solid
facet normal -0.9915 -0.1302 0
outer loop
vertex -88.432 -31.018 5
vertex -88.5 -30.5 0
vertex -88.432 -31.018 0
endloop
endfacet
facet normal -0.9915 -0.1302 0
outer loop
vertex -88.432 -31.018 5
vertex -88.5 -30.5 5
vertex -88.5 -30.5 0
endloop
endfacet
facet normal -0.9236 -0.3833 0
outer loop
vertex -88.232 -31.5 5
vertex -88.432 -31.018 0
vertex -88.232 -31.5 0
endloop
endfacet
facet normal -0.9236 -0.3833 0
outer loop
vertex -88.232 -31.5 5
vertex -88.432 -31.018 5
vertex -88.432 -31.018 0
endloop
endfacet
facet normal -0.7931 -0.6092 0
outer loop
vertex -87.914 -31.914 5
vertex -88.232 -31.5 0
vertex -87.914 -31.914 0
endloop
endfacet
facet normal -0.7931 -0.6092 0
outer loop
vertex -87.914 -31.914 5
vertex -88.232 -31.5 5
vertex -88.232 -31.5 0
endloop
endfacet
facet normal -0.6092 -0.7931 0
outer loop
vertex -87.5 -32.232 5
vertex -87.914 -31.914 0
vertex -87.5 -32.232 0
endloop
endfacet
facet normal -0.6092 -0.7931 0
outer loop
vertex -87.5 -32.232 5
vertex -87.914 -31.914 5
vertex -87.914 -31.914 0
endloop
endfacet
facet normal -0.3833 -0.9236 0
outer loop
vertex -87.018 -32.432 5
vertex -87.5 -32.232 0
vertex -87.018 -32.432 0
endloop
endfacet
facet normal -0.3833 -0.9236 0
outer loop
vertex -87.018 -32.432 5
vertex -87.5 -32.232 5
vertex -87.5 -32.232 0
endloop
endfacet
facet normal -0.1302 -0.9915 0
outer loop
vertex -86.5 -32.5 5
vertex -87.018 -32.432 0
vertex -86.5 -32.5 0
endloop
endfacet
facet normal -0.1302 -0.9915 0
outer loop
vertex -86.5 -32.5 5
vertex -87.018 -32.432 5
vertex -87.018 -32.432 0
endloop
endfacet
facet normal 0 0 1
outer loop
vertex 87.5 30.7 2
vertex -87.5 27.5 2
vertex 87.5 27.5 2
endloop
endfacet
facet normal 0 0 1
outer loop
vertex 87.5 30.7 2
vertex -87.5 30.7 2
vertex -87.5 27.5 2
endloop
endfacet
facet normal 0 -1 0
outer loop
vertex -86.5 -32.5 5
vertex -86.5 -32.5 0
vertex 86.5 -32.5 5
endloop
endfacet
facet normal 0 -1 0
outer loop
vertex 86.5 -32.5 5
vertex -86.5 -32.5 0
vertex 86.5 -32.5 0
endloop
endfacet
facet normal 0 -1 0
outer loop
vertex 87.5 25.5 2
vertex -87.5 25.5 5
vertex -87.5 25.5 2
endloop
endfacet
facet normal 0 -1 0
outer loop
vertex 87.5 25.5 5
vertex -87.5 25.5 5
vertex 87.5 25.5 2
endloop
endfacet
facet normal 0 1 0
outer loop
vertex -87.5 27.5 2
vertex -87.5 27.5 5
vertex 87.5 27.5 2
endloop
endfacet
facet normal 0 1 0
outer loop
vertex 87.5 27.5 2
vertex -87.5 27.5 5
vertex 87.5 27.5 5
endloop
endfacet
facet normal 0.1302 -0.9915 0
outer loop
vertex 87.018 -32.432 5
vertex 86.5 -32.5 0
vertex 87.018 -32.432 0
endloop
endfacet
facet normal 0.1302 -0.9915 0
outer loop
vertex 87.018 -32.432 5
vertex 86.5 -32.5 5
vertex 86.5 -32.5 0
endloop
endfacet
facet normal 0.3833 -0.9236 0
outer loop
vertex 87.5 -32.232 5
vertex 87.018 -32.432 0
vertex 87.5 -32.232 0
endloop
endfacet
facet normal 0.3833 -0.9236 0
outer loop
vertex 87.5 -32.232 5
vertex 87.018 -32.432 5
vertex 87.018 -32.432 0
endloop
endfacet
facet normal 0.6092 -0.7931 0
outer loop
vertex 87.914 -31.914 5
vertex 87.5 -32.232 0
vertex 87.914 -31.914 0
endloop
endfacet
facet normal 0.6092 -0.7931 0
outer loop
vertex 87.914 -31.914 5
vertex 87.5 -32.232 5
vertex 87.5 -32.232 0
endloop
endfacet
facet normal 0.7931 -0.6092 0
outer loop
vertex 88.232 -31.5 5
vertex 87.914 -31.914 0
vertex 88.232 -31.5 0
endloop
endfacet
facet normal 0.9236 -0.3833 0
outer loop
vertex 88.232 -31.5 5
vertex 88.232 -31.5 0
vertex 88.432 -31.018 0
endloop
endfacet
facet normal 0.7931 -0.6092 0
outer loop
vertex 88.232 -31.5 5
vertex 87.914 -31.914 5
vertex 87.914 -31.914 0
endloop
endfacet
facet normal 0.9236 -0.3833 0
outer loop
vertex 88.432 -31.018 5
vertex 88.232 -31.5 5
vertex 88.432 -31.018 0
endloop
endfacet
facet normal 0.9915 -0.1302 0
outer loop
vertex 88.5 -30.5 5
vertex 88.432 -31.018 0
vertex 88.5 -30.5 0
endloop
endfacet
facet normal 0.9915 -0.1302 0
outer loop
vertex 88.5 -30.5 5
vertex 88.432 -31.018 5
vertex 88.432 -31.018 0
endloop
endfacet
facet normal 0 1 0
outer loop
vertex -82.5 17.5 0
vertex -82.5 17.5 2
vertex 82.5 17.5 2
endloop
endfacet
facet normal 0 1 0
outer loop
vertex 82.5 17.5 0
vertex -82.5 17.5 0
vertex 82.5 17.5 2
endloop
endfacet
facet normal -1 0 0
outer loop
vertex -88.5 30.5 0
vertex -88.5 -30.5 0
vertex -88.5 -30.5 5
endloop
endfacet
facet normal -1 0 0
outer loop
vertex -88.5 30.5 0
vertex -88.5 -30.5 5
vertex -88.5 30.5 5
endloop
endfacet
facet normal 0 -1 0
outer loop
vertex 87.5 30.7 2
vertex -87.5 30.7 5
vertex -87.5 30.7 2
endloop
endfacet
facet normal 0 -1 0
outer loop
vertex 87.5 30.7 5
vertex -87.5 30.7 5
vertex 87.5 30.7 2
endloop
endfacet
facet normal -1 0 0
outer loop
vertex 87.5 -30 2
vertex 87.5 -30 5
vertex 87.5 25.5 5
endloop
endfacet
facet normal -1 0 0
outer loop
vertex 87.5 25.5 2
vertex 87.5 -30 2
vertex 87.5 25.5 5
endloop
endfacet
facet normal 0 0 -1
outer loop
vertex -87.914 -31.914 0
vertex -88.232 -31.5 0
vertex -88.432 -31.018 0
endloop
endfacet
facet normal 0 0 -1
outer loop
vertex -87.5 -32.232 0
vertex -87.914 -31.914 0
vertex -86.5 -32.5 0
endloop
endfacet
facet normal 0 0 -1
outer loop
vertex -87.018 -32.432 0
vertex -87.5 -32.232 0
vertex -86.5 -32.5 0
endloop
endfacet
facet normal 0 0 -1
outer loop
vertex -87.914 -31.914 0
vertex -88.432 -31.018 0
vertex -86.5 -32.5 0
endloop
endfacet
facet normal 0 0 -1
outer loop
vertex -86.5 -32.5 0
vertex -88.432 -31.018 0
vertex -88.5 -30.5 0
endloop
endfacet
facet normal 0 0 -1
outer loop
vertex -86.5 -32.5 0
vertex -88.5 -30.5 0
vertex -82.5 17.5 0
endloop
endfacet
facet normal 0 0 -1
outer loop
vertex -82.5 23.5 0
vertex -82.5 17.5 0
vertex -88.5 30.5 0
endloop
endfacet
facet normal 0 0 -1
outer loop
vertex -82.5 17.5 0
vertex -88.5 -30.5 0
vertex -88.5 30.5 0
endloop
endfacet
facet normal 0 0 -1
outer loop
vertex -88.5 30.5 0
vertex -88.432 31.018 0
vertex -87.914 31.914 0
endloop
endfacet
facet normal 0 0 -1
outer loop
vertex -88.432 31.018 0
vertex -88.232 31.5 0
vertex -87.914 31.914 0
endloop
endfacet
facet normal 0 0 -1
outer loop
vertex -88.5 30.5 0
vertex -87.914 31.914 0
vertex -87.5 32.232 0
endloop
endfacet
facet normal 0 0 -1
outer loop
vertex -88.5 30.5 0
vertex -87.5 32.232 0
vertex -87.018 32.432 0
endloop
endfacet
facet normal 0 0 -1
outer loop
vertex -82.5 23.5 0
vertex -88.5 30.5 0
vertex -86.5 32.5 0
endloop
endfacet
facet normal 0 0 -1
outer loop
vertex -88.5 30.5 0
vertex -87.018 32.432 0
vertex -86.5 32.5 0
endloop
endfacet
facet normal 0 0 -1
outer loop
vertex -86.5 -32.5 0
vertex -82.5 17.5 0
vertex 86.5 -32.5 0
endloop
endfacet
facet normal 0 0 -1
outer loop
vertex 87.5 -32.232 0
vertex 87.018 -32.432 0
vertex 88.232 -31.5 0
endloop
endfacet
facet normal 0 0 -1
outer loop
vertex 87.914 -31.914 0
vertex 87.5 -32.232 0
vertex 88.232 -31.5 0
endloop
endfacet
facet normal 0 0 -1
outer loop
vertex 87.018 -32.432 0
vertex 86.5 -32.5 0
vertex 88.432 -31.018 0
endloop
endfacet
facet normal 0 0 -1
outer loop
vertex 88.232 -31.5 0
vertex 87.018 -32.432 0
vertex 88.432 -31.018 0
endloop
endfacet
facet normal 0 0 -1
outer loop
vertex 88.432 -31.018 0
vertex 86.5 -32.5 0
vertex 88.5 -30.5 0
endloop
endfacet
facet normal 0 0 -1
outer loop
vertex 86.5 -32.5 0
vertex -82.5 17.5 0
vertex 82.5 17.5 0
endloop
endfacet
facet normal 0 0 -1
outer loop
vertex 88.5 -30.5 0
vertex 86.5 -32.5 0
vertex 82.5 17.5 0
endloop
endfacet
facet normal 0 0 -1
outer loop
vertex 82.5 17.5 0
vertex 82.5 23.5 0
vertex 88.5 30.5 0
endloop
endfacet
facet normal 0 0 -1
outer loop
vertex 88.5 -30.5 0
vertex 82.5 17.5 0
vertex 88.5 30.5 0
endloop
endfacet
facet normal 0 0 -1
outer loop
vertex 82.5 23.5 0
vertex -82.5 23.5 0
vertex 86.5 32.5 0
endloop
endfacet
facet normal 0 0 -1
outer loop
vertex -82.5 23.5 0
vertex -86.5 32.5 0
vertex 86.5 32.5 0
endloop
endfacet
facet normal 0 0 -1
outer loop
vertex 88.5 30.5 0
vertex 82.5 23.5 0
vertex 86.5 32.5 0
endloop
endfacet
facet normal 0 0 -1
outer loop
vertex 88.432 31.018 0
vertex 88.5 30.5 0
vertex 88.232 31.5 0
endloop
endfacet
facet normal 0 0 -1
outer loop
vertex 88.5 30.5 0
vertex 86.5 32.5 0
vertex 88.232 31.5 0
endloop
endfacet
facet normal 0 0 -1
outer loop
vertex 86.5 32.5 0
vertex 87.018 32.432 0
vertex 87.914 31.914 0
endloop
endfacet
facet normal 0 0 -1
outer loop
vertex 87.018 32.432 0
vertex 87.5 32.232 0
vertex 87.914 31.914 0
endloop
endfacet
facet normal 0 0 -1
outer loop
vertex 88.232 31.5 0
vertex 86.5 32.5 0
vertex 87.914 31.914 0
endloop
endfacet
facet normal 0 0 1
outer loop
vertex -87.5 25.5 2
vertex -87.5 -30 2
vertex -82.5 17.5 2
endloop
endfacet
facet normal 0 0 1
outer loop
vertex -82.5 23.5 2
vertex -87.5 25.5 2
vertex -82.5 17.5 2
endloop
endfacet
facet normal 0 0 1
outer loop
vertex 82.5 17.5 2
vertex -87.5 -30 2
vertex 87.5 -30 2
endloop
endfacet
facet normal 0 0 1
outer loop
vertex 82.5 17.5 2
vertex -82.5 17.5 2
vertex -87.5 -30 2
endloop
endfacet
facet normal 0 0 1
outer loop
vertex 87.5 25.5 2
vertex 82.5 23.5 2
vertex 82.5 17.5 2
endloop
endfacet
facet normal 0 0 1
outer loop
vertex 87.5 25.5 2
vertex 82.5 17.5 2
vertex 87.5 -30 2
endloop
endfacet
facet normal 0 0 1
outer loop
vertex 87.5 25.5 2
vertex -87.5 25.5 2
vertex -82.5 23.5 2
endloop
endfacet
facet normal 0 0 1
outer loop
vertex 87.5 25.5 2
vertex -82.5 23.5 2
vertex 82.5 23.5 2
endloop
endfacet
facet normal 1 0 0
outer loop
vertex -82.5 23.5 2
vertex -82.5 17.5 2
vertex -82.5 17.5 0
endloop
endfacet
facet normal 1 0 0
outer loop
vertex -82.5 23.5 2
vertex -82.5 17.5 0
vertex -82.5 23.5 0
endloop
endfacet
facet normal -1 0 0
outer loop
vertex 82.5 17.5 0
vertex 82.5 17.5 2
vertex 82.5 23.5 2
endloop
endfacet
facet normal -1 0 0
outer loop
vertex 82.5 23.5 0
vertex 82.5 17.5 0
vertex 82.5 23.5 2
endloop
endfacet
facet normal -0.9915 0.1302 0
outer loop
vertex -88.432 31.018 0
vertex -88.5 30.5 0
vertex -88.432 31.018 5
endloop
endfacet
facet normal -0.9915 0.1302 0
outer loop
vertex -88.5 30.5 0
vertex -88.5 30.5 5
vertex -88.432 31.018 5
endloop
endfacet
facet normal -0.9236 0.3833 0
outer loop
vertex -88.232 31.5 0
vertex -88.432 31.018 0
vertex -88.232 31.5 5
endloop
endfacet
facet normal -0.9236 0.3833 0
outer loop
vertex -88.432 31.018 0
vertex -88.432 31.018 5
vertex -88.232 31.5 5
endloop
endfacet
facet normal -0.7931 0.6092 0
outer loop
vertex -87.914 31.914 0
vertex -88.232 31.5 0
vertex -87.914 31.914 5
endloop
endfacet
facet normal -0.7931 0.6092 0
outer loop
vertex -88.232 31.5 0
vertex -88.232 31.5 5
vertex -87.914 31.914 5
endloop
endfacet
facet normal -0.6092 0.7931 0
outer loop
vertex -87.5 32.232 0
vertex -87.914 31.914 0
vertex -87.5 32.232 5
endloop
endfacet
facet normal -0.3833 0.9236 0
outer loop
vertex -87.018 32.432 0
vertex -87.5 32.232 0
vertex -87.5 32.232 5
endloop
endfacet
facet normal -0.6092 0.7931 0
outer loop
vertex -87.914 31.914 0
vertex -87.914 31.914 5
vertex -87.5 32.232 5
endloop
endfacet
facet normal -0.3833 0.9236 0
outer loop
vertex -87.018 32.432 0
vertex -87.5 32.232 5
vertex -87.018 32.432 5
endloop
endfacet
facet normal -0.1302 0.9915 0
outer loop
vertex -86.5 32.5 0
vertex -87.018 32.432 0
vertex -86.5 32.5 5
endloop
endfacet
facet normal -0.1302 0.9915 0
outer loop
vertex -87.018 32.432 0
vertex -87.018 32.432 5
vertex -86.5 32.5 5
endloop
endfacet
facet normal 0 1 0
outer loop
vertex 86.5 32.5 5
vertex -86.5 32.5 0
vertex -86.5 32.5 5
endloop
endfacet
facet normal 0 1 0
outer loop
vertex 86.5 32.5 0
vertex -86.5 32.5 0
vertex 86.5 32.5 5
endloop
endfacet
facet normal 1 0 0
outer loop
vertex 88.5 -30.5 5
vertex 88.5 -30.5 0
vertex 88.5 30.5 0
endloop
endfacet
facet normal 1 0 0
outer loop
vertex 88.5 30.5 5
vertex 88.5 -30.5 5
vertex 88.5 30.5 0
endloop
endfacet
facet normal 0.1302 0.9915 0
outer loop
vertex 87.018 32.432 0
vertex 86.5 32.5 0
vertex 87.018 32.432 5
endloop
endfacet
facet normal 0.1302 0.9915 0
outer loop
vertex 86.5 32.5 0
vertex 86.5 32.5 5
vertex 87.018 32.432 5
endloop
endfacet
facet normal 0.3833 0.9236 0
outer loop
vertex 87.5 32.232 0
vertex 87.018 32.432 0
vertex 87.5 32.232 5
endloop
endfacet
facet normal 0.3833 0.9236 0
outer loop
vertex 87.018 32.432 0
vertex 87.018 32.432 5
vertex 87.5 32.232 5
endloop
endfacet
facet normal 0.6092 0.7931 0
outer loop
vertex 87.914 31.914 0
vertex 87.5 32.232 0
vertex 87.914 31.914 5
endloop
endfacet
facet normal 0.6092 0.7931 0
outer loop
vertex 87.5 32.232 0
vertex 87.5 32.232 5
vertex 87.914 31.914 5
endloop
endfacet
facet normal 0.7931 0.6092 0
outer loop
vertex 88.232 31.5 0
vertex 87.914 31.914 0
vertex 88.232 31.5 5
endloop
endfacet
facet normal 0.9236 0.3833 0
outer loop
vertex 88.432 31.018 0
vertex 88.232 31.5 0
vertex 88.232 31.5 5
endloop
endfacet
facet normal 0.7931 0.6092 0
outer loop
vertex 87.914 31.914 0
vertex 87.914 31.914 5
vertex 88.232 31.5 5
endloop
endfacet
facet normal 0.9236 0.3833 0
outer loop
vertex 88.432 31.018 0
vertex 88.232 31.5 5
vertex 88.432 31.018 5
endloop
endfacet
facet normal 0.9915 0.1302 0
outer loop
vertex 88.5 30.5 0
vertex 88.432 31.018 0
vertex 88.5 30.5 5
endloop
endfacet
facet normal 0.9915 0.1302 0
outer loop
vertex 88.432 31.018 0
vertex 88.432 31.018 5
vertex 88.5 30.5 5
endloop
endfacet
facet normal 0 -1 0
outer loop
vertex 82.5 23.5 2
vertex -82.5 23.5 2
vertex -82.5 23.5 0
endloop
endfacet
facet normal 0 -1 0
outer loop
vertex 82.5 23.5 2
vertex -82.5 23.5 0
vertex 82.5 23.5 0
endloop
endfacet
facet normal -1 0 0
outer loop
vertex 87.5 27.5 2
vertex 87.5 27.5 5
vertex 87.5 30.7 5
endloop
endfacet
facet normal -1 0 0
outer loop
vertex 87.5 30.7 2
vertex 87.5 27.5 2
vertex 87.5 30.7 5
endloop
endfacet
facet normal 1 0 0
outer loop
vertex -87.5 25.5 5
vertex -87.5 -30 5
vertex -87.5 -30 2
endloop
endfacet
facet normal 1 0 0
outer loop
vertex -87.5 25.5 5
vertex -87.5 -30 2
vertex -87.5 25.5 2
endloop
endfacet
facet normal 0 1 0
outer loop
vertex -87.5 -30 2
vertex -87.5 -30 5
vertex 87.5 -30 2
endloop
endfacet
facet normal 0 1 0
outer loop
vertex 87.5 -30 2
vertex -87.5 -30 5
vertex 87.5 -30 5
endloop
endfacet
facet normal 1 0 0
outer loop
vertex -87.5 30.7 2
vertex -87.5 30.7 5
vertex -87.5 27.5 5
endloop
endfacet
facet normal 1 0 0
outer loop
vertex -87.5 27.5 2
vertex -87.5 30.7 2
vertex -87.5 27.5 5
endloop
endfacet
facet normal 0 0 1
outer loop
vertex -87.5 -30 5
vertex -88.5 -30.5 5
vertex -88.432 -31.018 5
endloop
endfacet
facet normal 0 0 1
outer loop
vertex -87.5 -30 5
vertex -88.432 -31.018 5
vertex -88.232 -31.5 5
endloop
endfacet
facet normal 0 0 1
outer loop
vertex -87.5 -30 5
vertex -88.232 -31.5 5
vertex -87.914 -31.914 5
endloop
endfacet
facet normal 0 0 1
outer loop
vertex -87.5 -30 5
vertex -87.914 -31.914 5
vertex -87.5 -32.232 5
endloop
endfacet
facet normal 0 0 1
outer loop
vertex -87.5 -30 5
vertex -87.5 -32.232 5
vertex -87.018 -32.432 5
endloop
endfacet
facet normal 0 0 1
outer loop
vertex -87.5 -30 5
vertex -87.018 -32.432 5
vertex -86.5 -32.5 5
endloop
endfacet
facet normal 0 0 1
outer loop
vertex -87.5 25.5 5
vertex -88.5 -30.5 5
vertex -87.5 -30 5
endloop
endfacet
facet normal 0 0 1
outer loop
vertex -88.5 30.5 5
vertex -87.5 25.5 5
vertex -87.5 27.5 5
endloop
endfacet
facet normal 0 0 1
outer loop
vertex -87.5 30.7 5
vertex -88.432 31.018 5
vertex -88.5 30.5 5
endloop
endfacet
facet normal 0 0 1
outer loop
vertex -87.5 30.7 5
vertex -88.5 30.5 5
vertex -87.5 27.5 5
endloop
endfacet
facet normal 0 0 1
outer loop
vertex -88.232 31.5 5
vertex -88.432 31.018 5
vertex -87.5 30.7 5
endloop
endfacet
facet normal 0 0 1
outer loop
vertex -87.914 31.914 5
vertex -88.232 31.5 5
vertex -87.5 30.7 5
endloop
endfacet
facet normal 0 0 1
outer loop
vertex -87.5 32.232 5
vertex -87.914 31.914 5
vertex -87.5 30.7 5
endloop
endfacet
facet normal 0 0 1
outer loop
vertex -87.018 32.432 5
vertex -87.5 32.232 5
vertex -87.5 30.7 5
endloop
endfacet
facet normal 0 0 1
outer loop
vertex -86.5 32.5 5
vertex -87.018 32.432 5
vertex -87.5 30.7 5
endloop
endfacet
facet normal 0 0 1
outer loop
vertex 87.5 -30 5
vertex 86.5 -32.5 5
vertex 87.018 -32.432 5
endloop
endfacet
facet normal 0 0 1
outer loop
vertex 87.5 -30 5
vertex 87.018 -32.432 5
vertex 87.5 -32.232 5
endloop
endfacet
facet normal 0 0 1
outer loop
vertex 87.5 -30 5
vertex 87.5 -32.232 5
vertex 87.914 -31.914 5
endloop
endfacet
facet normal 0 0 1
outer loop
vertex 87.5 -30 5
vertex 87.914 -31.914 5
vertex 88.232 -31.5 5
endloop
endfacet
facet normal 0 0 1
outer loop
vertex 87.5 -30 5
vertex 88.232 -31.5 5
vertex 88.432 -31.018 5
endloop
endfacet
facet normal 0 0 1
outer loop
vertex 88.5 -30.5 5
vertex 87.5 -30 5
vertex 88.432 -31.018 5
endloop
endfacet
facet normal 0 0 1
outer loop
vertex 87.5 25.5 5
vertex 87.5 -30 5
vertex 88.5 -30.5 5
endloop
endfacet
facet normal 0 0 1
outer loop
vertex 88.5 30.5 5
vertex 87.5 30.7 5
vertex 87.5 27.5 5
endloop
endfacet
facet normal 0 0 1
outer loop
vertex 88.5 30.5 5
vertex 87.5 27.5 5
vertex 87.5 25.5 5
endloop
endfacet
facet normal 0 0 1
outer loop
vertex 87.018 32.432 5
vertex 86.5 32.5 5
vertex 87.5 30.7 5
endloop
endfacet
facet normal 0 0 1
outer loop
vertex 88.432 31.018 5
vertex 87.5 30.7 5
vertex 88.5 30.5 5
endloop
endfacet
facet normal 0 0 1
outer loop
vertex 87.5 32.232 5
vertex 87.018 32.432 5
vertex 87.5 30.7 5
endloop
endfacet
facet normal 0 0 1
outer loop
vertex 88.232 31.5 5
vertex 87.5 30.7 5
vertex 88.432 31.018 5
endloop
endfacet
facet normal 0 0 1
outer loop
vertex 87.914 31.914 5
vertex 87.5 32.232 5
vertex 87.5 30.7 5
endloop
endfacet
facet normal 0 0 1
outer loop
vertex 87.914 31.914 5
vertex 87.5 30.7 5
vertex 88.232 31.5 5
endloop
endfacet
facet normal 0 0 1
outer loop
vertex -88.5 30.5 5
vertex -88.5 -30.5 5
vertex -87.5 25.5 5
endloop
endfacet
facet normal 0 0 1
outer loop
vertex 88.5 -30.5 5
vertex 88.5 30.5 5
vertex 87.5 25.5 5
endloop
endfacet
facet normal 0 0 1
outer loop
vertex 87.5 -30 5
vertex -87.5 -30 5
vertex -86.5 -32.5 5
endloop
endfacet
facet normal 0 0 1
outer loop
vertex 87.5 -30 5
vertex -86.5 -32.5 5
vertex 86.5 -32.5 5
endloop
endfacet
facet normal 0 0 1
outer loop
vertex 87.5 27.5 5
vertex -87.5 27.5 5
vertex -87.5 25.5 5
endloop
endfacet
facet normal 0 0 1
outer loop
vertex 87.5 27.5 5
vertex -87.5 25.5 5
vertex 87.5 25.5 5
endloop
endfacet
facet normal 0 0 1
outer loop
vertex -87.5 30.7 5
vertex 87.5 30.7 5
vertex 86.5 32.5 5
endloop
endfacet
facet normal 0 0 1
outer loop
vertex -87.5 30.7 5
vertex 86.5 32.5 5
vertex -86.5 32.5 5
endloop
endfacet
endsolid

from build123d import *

# Parameters (mm, degrees)
SKETCH_1_W          = 177
SKETCH_1_H          = 65
EXTRUDE_1_DEPTH     = 5
SKETCH_2_W          = 175
SKETCH_2_H          = 2.5
SKETCH_2_H_2        = 55.5
SKETCH_2_H_3        = 0.7
CUT_EXTRUDE_1_DEPTH = 3
FILLET_1_R          = 2
SKETCH_4_W          = 165
SKETCH_4_H          = 6
CUT_EXTRUDE_2_DEPTH = 3


with BuildPart() as part:
    # 草图1 → 凸台-拉伸1 (new body)
    with BuildSketch(Plane.XY):
        Rectangle(SKETCH_1_W, SKETCH_1_H)
    extrude(amount=EXTRUDE_1_DEPTH)

    # 草图2 → 切除-拉伸1 (cut)
    with BuildSketch(Plane.XY.offset(5)):
        with Locations((0, 28.75)):
            Rectangle(SKETCH_2_W, SKETCH_2_H)
        with Locations((0, -2.25)):
            Rectangle(SKETCH_2_W, SKETCH_2_H_2)
        with Locations((0, 30.35)):
            Rectangle(SKETCH_2_W, SKETCH_2_H_3)
    extrude(amount=-CUT_EXTRUDE_1_DEPTH, mode=Mode.SUBTRACT)

    # 圆角1
    fillet_1_edges = [part.edges().sort_by_distance(p)[0] for p in [
        (88.5, -32.5, 2.5),
        (-88.5, -32.5, 2.5),
        (-88.5, 32.5, 2.5),
        (88.5, 32.5, 2.5),
    ]]
    fillet(fillet_1_edges, radius=FILLET_1_R)

    # 草图4 → 切除-拉伸2 (cut)
    with BuildSketch(Plane.XY.offset(2)):
        with Locations((0, 20.5)):
            Rectangle(SKETCH_4_W, SKETCH_4_H)
    extrude(amount=-CUT_EXTRUDE_2_DEPTH, mode=Mode.SUBTRACT)


solid = part.part
